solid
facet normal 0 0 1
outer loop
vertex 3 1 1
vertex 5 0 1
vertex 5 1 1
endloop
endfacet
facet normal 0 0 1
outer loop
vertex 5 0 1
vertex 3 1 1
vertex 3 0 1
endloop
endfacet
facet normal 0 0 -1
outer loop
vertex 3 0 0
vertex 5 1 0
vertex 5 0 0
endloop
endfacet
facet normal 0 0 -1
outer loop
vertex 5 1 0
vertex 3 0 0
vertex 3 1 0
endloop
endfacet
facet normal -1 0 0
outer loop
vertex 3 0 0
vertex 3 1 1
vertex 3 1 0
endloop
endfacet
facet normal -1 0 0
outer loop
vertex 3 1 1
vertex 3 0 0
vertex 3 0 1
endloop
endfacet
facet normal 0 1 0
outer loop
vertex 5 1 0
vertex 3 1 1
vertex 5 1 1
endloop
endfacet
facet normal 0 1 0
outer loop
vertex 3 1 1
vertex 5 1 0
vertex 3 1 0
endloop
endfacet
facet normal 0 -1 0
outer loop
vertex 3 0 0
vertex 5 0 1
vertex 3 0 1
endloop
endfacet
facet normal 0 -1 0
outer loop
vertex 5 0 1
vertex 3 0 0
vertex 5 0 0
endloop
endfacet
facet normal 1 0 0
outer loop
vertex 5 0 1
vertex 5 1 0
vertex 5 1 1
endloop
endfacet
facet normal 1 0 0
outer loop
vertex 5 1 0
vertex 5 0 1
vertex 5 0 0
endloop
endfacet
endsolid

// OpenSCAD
versatz = 3;
function summe(v, i = 0) = i >= len(v) ? 0 : v[i] + summe(v, i + 1);
function abstand() = versatz * 2;
module reihe(n, d) {
    echo(n = n, kinder = $children);
    for (i = [0:n - 1]) translate([i * d + versatz, 0, 0]) children();
}
module fn_test() echo(fn = $fn, v = versatz);
reihe(2, 1) cube(1);
